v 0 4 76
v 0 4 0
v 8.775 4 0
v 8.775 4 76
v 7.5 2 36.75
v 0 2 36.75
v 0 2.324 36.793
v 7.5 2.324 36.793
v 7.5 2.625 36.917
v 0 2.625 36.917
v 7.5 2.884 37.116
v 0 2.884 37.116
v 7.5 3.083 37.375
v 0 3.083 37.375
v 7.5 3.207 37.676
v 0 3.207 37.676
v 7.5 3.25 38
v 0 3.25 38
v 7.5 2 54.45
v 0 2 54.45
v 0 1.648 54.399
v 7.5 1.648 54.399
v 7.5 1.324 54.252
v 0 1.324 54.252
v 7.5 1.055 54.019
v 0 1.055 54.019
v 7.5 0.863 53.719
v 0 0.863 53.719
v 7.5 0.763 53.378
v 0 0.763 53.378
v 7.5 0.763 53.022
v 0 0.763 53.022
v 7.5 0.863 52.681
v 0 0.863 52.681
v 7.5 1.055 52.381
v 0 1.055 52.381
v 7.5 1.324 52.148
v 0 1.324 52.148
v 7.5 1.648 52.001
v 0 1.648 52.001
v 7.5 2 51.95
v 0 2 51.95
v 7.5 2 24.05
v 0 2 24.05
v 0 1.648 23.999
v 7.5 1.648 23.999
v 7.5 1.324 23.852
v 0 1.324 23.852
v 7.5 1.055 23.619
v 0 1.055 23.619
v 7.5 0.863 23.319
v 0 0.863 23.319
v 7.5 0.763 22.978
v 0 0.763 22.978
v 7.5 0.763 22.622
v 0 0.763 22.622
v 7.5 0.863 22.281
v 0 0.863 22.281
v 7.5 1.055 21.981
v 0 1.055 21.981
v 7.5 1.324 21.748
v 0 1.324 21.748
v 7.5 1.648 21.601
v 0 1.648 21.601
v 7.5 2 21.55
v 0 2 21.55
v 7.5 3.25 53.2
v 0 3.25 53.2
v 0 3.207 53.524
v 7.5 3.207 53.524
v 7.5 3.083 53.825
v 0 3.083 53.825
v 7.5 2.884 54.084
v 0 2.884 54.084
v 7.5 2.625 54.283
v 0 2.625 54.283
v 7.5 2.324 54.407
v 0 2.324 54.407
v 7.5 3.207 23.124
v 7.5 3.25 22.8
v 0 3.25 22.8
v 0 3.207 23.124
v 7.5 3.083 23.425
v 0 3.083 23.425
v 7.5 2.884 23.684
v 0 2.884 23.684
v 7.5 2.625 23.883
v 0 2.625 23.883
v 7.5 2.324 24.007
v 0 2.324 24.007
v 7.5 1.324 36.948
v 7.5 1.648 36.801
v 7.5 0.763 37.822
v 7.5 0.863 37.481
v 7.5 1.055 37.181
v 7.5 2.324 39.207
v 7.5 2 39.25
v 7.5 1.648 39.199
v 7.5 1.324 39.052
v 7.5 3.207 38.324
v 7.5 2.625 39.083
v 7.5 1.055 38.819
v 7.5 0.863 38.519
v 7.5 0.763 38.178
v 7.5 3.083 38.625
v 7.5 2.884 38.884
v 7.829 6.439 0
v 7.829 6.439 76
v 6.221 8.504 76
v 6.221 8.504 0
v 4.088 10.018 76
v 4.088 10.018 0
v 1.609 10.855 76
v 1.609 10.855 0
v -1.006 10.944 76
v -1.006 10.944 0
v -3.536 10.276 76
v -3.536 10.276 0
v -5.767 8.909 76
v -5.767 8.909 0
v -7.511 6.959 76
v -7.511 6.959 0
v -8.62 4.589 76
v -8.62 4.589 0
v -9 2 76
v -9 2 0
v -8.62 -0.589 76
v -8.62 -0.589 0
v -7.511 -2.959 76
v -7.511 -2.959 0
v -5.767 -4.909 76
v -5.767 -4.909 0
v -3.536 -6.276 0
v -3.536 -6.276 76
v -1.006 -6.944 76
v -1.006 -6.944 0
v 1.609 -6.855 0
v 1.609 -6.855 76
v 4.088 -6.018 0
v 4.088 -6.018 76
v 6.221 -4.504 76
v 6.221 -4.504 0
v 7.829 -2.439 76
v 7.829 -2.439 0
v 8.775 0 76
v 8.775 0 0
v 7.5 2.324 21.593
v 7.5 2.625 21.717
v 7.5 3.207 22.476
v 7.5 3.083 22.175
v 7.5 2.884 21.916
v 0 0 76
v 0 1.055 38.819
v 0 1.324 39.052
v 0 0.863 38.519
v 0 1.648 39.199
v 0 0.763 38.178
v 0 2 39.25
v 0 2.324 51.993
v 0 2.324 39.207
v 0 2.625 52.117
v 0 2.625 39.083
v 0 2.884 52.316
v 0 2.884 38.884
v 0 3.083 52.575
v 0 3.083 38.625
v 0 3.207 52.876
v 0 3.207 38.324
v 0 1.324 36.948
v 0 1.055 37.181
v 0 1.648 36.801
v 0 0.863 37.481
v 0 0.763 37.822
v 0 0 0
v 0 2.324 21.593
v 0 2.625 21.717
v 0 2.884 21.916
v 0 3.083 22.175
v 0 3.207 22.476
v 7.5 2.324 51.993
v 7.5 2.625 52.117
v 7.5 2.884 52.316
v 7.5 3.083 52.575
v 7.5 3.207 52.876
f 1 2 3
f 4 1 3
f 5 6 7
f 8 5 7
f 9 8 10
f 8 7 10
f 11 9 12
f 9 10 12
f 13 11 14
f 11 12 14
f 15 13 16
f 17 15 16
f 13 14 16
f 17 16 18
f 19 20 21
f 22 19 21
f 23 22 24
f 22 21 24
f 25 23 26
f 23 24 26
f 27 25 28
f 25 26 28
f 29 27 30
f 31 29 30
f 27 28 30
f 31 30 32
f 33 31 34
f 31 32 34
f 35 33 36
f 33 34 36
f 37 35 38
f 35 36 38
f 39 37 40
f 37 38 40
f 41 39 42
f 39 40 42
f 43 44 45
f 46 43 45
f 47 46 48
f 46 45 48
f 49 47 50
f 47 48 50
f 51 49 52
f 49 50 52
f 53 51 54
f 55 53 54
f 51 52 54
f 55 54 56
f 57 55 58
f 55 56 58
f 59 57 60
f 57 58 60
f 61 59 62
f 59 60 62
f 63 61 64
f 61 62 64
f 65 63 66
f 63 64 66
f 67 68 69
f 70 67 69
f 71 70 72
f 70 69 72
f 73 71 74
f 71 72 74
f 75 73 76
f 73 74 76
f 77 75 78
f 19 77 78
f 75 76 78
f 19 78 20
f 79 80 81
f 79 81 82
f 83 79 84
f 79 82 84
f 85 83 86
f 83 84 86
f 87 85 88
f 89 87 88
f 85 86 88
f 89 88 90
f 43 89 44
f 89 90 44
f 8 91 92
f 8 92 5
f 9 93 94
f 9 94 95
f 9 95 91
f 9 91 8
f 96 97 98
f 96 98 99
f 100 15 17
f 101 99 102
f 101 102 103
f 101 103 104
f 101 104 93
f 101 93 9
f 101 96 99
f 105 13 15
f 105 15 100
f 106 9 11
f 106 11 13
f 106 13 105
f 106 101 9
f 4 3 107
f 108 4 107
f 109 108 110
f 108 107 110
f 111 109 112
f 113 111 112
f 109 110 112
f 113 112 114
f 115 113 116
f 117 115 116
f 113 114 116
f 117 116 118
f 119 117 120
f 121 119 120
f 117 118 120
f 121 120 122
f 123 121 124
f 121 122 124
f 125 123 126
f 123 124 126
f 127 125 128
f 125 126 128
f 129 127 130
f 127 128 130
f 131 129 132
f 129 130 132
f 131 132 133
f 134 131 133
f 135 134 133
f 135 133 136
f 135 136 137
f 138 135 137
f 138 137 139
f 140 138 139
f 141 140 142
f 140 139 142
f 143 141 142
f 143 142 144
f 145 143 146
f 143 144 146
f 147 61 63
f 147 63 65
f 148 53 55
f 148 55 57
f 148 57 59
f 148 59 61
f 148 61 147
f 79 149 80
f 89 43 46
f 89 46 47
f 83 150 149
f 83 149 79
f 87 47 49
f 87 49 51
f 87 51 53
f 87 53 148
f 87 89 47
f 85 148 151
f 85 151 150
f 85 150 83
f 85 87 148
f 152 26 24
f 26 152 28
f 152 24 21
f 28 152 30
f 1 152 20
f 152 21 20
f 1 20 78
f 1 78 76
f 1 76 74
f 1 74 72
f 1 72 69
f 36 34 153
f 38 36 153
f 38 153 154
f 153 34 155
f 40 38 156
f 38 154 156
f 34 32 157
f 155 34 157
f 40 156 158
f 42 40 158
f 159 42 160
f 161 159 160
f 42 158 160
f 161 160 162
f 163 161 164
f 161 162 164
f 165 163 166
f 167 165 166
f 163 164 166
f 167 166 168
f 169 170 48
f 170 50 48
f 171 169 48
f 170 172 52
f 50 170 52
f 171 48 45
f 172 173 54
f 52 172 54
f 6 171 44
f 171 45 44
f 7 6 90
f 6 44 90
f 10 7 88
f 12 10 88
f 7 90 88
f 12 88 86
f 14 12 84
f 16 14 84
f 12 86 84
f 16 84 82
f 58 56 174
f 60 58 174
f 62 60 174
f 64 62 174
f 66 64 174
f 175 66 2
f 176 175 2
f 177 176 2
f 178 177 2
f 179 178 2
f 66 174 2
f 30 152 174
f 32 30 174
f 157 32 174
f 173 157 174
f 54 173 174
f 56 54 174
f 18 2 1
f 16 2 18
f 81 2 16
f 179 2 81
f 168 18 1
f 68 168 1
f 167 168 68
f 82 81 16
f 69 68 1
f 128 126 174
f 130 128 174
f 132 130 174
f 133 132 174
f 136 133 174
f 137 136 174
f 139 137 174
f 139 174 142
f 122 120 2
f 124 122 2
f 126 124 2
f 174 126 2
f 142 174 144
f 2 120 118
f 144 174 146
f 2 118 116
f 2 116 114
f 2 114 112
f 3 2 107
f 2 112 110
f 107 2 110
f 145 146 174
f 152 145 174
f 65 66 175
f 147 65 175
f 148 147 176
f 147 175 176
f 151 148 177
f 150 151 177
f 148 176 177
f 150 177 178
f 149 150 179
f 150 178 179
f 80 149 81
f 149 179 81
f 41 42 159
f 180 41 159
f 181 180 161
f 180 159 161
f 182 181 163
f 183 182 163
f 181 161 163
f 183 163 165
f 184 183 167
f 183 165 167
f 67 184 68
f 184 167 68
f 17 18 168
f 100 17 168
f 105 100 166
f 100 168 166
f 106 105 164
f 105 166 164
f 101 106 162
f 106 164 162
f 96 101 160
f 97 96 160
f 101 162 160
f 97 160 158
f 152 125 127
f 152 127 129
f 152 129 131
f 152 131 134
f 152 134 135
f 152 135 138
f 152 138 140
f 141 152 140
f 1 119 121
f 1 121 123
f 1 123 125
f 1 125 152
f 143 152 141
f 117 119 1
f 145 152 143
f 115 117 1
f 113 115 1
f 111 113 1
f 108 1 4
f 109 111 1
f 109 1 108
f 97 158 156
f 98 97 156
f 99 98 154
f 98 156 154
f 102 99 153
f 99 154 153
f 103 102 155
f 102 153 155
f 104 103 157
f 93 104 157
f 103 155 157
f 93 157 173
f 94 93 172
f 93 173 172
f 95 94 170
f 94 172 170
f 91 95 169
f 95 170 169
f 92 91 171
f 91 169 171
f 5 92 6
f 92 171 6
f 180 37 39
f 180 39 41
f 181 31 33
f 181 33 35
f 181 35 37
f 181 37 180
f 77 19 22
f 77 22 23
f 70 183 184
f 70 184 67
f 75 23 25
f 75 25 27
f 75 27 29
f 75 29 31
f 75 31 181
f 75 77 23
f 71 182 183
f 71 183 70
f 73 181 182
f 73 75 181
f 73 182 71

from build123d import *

# Parameters (mm, degrees)
F1_DEPTH = 76
F3_DEPTH = 7.5


with BuildPart() as f1:
    # F0 (on Top) → F1 (new body)
    with BuildSketch(Plane.XY):
        with BuildLine():
            Line((0, 4), (8.774964, 4))
            ThreePointArc((8.774964, 4), (-9, 2), (8.774964, 0))
            Line((8.774964, 0), (0, 0))
            Line((0, 0), (0, 2))
            Line((0, 2), (0, 4))
        make_face()
    extrude(amount=F1_DEPTH)

    # F2 (on face) → F3 (join)
    with BuildSketch(Plane.YZ):
        with BuildLine():
            Line((2, 54.45), (2, 53.2))
            Line((2, 53.2), (2, 51.95))
            ThreePointArc((2, 51.95), (2.883883, 52.316117), (3.25, 53.2))
            ThreePointArc((3.25, 53.2), (2.883883, 54.083883), (2, 54.45))
        make_face()
        with BuildLine():
            Line((2, 51.95), (2, 53.2))
            Line((2, 53.2), (2, 54.45))
            ThreePointArc((2, 54.45), (0.75, 53.2), (2, 51.95))
        make_face()
        with BuildLine():
            ThreePointArc((3.25, 22.8), (2.883883, 23.683883), (2, 24.05))
            Line((2, 24.05), (2, 22.8))
            Line((2, 22.8), (2, 21.55))
            ThreePointArc((2, 21.55), (2.883883, 21.916117), (3.25, 22.8))
        make_face()
        with BuildLine():
            Line((2, 22.8), (2, 24.05))
            ThreePointArc((2, 24.05), (0.75, 22.8), (2, 21.55))
            Line((2, 21.55), (2, 22.8))
        make_face()
        with BuildLine():
            ThreePointArc((3.25, 38), (2.883883, 38.883883), (2, 39.25))
            Line((2, 39.25), (2, 38))
            Line((2, 38), (2, 36.75))
            ThreePointArc((2, 36.75), (2.883883, 37.116117), (3.25, 38))
        make_face()
        with BuildLine():
            Line((2, 38), (2, 39.25))
            ThreePointArc((2, 39.25), (0.75, 38), (2, 36.75))
            Line((2, 36.75), (2, 38))
        make_face()
    extrude(amount=F3_DEPTH)


solid = f1.part
